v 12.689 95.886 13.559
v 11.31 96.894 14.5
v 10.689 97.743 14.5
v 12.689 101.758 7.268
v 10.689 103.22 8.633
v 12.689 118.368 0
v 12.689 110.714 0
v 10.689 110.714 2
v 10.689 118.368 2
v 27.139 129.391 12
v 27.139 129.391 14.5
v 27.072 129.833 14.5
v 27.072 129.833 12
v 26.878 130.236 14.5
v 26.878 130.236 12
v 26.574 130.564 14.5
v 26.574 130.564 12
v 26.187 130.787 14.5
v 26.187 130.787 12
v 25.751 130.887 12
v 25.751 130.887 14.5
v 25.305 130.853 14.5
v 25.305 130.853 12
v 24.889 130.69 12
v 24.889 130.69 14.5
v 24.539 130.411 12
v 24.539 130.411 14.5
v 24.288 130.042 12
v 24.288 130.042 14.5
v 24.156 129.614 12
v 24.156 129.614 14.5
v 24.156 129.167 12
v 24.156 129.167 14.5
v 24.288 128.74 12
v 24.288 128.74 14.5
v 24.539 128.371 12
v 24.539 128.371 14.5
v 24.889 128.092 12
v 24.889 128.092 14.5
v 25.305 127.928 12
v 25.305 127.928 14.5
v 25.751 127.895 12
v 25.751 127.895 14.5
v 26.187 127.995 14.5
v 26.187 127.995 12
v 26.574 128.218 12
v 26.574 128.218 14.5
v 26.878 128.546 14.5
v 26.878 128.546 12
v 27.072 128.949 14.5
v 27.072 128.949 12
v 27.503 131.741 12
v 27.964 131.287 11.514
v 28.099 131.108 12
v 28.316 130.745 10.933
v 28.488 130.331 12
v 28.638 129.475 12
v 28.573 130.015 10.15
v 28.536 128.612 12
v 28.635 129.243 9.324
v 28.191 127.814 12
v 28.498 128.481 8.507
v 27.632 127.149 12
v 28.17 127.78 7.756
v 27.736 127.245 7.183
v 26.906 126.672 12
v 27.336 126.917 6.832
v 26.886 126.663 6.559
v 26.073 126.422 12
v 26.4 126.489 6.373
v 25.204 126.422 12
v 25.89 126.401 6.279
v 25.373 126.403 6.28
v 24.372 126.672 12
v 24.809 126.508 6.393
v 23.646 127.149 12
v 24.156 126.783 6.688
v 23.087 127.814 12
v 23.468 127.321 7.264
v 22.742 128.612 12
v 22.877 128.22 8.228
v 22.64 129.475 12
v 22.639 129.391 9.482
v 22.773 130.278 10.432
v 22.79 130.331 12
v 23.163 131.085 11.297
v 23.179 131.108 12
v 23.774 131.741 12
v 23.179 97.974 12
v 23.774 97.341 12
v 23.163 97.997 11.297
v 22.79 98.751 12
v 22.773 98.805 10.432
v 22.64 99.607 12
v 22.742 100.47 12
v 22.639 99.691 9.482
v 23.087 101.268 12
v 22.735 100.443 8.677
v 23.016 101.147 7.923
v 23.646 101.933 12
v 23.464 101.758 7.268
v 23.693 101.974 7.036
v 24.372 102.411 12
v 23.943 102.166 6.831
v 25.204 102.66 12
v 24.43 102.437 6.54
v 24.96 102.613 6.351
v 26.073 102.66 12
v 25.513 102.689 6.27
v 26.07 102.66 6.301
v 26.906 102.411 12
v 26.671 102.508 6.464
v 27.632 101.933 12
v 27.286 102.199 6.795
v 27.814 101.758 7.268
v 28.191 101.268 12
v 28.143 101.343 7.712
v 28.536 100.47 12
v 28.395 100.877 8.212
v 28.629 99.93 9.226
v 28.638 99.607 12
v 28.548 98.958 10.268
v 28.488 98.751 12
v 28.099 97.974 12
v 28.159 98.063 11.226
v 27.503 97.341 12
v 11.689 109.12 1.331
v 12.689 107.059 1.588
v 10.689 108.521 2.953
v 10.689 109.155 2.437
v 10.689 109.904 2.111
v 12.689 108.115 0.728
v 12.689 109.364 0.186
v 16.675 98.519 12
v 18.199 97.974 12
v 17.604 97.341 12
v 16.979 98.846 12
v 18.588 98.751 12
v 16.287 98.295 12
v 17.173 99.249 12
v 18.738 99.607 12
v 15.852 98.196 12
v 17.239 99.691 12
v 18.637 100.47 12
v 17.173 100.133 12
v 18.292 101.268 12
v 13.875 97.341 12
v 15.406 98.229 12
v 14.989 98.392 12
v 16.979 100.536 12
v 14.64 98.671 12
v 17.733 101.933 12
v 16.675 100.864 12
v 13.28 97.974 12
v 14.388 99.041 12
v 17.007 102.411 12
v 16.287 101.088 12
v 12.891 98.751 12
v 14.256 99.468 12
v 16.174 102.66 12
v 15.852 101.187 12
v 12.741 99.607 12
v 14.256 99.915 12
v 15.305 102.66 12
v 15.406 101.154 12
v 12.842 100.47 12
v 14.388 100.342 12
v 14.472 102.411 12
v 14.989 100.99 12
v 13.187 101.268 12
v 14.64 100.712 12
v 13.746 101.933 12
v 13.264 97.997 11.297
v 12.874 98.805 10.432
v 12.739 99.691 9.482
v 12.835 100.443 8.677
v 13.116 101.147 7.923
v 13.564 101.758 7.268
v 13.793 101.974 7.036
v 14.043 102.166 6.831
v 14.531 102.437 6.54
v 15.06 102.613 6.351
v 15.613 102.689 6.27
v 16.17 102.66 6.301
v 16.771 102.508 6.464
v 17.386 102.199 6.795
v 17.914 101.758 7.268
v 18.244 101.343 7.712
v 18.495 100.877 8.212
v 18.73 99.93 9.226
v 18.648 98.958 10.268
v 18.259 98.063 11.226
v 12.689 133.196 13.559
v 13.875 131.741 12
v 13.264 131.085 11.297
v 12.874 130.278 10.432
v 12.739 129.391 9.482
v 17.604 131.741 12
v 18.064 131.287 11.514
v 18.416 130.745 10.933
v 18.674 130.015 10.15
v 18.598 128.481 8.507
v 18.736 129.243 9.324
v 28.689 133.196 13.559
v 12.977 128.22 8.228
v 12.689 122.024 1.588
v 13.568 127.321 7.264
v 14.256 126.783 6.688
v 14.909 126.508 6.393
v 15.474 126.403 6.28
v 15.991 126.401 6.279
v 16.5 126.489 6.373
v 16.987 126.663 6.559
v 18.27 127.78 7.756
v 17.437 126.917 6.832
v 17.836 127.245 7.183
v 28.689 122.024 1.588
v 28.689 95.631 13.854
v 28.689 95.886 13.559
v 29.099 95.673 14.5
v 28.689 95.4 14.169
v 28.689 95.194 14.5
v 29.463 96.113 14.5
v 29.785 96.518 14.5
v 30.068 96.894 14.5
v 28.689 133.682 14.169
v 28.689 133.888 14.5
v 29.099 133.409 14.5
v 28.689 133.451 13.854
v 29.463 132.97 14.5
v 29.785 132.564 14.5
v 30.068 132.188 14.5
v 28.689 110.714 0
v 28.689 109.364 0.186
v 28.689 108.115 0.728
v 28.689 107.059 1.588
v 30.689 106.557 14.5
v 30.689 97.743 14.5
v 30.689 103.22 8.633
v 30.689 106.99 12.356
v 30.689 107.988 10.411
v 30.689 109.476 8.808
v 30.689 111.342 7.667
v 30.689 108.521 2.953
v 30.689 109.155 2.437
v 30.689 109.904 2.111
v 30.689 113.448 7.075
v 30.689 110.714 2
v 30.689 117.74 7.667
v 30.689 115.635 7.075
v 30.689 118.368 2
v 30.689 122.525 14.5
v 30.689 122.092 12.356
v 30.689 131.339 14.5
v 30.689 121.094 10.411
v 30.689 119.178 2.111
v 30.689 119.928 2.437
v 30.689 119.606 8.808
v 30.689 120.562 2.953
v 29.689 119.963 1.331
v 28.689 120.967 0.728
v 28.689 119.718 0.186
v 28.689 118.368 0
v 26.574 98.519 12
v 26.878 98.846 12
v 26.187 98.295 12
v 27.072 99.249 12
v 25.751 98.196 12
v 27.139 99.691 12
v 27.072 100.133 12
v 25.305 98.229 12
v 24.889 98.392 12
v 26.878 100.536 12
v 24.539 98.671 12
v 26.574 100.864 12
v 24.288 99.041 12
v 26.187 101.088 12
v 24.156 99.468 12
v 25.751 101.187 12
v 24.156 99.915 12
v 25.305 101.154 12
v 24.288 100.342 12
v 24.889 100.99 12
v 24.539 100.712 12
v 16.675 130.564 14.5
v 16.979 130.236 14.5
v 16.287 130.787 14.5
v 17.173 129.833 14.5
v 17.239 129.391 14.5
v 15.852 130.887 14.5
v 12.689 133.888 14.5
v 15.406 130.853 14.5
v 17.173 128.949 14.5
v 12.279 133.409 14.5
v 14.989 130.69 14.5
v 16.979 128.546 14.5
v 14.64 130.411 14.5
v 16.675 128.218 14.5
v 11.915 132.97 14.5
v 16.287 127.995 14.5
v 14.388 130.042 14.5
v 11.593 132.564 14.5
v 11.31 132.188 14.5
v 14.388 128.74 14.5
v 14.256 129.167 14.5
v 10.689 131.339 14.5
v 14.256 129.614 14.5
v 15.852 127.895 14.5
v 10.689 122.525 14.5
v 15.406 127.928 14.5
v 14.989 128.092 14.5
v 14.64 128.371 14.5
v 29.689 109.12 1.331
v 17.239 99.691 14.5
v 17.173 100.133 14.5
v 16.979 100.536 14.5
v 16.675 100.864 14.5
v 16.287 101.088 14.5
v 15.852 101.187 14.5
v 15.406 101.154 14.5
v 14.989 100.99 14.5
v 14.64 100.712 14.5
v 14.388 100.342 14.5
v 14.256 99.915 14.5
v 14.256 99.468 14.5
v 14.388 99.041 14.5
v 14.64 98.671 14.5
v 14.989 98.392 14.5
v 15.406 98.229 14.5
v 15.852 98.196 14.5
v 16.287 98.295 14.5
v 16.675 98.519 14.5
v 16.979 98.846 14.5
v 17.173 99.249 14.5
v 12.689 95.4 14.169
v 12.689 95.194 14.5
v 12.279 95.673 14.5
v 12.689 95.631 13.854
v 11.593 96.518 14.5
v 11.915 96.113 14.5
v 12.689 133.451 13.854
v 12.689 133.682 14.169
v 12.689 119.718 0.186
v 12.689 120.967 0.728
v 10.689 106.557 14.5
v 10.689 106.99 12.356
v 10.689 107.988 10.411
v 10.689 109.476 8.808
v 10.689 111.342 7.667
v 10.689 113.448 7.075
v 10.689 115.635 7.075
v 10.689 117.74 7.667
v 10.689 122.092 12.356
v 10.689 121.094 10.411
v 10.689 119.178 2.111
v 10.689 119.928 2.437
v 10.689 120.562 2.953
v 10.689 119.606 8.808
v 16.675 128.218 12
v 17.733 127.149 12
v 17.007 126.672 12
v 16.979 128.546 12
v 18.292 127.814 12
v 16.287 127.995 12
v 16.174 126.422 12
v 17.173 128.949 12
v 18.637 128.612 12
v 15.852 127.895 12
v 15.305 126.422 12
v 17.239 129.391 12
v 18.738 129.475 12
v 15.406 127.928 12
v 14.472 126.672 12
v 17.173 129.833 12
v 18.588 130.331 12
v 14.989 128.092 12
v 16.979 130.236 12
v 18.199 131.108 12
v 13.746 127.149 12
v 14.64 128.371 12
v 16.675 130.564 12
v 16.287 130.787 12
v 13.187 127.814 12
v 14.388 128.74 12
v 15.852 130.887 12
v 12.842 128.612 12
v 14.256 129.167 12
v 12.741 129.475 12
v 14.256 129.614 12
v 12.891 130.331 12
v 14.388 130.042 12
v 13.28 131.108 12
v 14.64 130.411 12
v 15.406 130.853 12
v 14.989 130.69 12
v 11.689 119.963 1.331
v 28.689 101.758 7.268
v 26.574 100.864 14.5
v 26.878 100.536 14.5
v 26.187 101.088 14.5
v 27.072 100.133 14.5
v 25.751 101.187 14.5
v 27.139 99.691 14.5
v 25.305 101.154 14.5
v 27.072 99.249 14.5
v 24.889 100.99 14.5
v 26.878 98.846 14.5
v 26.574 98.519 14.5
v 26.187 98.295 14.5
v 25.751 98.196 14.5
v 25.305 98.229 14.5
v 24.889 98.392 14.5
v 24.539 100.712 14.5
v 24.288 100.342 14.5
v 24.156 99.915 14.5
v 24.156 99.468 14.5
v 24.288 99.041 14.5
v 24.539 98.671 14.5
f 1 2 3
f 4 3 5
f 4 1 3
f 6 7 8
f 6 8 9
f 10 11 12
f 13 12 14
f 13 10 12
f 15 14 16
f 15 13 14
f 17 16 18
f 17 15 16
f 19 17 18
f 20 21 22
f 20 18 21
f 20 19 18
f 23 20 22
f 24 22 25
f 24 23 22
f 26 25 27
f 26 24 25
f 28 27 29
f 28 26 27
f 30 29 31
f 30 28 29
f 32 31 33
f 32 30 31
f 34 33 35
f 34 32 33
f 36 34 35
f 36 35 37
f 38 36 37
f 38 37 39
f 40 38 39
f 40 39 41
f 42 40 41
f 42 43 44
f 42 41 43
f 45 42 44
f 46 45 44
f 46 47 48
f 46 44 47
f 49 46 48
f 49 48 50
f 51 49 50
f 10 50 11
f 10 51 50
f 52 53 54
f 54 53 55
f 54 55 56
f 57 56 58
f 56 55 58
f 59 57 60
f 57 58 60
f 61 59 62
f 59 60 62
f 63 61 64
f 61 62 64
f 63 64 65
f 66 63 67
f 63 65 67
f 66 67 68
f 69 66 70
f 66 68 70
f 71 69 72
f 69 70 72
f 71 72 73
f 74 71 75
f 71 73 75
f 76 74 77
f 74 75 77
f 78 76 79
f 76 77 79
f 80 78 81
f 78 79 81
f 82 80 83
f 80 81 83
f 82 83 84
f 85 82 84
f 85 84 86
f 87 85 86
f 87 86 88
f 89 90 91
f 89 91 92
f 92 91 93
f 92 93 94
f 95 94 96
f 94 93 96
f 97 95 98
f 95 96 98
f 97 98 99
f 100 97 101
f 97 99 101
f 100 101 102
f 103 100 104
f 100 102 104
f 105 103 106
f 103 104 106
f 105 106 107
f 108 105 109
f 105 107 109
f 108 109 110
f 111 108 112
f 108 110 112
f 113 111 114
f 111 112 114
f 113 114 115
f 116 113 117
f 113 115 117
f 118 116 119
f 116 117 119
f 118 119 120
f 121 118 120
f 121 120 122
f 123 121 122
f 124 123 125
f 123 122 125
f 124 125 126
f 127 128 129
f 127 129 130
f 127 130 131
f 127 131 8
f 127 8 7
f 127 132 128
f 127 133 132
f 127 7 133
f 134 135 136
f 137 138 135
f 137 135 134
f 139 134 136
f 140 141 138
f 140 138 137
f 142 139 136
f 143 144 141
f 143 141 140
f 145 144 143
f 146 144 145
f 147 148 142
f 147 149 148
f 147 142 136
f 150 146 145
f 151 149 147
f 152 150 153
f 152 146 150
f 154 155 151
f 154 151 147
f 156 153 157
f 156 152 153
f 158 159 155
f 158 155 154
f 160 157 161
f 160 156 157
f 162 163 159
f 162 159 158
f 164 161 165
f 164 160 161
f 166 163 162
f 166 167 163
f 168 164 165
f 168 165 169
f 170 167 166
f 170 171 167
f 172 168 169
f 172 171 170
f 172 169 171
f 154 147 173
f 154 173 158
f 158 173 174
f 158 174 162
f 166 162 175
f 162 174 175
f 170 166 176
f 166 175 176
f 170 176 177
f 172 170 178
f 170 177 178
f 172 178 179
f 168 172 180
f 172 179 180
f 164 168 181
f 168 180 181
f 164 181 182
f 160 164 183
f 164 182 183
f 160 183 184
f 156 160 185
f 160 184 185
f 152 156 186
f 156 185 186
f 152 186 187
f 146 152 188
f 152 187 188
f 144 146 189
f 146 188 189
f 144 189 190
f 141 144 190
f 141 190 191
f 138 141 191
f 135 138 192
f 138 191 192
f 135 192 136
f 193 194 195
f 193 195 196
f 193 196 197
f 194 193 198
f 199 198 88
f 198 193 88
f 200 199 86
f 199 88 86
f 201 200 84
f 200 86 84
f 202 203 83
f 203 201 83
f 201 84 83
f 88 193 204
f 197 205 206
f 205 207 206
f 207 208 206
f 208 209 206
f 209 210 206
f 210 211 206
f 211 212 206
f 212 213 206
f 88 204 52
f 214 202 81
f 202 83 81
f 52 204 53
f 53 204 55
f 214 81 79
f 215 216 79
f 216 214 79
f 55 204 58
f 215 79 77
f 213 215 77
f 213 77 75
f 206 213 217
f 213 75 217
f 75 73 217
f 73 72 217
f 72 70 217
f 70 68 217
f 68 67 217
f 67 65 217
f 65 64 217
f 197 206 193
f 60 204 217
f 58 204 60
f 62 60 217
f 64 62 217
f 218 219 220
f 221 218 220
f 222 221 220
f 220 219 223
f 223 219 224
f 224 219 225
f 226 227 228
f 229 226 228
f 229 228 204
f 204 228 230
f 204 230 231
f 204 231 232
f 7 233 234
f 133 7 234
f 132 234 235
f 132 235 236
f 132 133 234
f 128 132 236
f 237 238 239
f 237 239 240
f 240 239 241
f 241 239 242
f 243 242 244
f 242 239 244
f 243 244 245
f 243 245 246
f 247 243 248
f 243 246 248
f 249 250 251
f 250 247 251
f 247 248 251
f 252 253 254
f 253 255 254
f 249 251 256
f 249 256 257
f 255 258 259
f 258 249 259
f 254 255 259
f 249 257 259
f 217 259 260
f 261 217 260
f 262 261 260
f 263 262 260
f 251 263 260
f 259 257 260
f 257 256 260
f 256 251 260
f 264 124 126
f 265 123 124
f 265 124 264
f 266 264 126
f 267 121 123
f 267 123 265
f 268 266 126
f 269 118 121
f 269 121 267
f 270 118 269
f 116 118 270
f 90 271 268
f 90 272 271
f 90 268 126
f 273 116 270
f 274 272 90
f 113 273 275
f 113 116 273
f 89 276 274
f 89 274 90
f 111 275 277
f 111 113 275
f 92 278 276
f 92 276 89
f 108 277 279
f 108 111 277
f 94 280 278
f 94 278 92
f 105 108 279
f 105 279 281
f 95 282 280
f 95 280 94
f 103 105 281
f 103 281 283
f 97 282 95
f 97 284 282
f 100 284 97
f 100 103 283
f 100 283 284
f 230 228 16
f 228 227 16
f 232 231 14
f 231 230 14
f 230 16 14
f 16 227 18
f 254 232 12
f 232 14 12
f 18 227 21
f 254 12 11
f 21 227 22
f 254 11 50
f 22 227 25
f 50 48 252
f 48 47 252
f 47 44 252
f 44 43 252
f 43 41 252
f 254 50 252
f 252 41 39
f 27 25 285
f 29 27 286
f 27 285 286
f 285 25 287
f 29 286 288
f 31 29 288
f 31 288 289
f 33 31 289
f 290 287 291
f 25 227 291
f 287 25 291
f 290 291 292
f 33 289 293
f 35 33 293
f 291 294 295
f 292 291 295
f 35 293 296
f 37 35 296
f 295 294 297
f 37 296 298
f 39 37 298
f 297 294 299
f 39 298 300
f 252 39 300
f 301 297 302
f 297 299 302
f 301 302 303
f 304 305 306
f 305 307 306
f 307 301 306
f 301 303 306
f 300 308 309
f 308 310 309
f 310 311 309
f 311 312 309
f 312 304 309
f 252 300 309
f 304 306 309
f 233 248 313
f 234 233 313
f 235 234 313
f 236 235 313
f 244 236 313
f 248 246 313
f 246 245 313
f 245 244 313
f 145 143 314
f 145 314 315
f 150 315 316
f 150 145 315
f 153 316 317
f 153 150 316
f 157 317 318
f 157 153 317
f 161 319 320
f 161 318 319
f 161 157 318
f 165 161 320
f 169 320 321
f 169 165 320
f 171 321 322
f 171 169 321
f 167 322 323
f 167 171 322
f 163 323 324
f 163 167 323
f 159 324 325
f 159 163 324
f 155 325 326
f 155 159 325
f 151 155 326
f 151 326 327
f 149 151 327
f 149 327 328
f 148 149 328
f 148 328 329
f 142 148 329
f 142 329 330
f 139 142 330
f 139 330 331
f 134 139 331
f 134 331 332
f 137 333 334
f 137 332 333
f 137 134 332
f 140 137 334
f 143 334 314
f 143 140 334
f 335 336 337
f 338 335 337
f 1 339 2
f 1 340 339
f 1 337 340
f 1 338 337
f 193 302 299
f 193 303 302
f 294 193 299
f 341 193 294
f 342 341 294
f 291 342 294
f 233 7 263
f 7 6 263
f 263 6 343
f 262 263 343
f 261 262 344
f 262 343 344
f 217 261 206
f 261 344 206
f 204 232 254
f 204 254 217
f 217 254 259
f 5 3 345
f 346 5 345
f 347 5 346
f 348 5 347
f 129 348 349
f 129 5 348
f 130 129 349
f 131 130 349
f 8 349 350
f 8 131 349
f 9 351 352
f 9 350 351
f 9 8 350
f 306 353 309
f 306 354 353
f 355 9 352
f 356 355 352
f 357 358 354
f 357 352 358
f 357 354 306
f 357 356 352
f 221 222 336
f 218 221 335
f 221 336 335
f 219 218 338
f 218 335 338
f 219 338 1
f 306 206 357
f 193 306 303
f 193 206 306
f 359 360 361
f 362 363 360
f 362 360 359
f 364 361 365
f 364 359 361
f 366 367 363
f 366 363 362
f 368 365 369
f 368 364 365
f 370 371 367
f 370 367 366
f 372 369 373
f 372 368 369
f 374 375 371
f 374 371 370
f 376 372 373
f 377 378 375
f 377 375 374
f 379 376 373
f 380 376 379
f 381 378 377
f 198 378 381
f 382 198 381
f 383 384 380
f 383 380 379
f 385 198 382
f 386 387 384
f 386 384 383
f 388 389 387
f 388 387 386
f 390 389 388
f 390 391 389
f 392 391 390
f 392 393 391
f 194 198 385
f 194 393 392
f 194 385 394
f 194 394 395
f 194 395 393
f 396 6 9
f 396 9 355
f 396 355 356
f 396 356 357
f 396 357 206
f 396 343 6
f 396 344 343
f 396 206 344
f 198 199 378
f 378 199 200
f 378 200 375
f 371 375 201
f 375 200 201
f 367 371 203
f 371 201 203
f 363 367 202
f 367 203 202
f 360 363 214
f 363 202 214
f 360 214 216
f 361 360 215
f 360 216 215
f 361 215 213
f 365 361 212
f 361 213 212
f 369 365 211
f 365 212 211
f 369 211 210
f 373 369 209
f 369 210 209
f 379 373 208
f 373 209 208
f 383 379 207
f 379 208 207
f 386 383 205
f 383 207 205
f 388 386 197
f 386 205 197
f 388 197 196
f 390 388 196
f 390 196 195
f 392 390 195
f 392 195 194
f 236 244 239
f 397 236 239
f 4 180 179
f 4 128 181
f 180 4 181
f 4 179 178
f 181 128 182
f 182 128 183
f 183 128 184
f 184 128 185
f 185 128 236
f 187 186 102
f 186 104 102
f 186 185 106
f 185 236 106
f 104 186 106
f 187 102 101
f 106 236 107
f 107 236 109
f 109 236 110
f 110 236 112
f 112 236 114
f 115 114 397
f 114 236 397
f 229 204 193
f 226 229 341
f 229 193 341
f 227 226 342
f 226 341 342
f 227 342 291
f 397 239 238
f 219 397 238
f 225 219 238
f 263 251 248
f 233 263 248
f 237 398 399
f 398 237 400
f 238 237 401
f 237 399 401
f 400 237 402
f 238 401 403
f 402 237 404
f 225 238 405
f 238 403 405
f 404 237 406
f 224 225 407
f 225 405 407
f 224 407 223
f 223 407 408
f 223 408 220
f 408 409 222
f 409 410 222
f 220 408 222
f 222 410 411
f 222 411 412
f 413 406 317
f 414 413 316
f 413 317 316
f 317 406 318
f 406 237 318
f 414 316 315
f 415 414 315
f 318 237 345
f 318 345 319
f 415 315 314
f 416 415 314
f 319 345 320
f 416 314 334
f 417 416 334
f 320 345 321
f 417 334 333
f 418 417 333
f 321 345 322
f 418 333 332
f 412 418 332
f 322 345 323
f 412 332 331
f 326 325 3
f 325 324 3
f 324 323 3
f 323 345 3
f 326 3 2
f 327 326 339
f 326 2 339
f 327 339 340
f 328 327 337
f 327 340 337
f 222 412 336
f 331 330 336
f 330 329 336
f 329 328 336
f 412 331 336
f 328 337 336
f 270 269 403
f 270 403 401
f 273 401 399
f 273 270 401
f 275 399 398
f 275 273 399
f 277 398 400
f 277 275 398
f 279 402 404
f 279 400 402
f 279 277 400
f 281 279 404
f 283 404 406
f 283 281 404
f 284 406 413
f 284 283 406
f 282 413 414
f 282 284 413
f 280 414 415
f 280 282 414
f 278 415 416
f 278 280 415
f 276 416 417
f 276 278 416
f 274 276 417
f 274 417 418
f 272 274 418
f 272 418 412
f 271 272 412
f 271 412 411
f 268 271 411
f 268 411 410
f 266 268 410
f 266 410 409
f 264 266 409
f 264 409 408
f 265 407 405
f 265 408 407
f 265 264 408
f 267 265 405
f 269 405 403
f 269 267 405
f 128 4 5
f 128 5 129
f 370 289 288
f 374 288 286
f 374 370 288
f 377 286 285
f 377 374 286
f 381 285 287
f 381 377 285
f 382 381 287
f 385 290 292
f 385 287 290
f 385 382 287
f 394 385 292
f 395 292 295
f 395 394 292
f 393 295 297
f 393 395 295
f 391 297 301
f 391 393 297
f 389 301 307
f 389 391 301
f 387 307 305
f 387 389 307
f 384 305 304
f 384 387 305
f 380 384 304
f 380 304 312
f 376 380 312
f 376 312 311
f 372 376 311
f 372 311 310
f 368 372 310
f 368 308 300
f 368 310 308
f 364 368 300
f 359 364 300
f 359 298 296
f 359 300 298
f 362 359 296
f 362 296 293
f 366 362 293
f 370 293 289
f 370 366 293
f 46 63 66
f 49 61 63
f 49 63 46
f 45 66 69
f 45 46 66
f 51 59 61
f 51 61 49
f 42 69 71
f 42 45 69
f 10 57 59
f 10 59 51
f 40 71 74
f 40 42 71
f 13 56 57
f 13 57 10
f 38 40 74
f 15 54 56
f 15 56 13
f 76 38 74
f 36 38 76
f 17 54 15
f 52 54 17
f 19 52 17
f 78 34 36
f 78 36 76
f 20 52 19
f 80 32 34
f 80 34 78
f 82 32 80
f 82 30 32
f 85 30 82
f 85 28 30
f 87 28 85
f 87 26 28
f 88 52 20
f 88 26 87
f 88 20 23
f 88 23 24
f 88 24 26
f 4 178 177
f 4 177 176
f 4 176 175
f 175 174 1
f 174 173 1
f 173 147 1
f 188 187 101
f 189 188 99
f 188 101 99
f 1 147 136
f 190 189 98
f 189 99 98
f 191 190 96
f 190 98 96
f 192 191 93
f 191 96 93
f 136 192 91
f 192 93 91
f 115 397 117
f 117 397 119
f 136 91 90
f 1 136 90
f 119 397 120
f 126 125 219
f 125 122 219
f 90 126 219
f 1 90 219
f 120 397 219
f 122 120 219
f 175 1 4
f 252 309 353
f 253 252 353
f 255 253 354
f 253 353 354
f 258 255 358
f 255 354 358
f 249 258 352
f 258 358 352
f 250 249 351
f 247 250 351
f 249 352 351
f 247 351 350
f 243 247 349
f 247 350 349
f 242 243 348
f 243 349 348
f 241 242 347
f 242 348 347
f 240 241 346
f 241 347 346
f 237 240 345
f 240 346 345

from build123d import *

# Parameters (mm, degrees)
SKETCH2_W           = 20
SKETCH2_H           = 49.6
SKETCH2_R           = 1.5
BOSS_EXTRUDE1_DEPTH = 30
CUT_EXTRUDE1_DEPTH  = 30
CUT_EXTRUDE2_DEPTH  = 22
FILLET1_R           = 5
FILLET2_R           = 2
CHAMFER1_SIZE       = 2
SKETCH5_R           = 3
SKETCH5_R_2         = 1.5
CUT_EXTRUDE3_DEPTH  = 12
CUT_EXTRUDE4_DEPTH  = 23


with BuildPart() as part:
    # Sketch2 → Boss-Extrude1 (new body)
    with BuildSketch(Plane.XY):
        with Locations((20.689228864, 114.541105708)):
            Rectangle(SKETCH2_W, SKETCH2_H)
        with Locations((15.739481395, 99.69135824)):
            Circle(SKETCH2_R, mode=Mode.SUBTRACT)
        with Locations((25.638976332, 99.69135824)):
            Circle(SKETCH2_R, mode=Mode.SUBTRACT)
        with Locations((25.638976332, 129.390853177)):
            Circle(SKETCH2_R, mode=Mode.SUBTRACT)
        with Locations((15.739481395, 129.390853177)):
            Circle(SKETCH2_R, mode=Mode.SUBTRACT)
    extrude(amount=BOSS_EXTRUDE1_DEPTH)

    # Sketch3 → Cut-Extrude1 (cut)
    with BuildSketch(Plane(origin=(30.689228864, 0, 0), x_dir=(0, 0, -1), z_dir=(1, 0, 0))):
        Polygon((-10, 119.541105708), (-18.024193548, 119.541105708), (-11.975806452, 109.541105708), (-10, 109.541105708), align=None)
        Polygon((-11.975806452, 109.541105708), (-18.024193548, 119.541105708), (-20, 119.541105708), (-20, 109.541105708), align=None)
    extrude(amount=-CUT_EXTRUDE1_DEPTH, mode=Mode.SUBTRACT)

    # Sketch4 → Cut-Extrude2 (cut)
    with BuildSketch(Plane(origin=(30.689228864, 0, 0), x_dir=(0, 0, -1), z_dir=(1, 0, 0))):
        Polygon((-30, 139.341105708), (-27.096774194, 134.541105708), (-15, 134.541105708), (0, 134.541105708), (0, 139.341105708), align=None)
        Polygon((-30, 134.541105708), (-27.096774194, 134.541105708), (-30, 139.341105708), align=None)
        Polygon((-15, 134.541105708), (0, 120.541105708), (0, 134.541105708), align=None)
        Polygon((-7.268041237, 101.757600554), (-2.903225806, 94.541105708), (0, 94.541105708), (0, 108.541105708), align=None)
        Polygon((-15, 94.541105708), (-2.903225806, 94.541105708), (-7.268041237, 101.757600554), align=None)
        Polygon((-30, 89.741105708), (0, 89.741105708), (-2.903225806, 94.541105708), (-15, 94.541105708), (-30, 94.541105708), align=None)
        Polygon((-2.903225806, 94.541105708), (0, 89.741105708), (0, 94.541105708), align=None)
    extrude(amount=-CUT_EXTRUDE2_DEPTH, mode=Mode.SUBTRACT)

    # Fillet1
    fillet1_edges = [part.edges().sort_by_distance(p)[0] for p in [
        (20.689228864, 134.541105708, 15),
        (20.689228864, 120.541105708, 0),
        (20.689228864, 94.541105708, 15),
        (20.689228864, 108.541105708, 0),
    ]]
    fillet(fillet1_edges, radius=FILLET1_R)

    # Fillet2
    fillet2_edges = [part.edges().sort_by_distance(p)[0] for p in [
        (20.689228864, 134.541105708, 30),
        (20.689228864, 94.541105708, 30),
    ]]
    fillet(fillet2_edges, radius=FILLET2_R)

    # Chamfer1
    chamfer1_edges = [part.edges().sort_by_distance(p)[0] for p in [
        (30.689228864, 127.610001295, 7.5738167),
        (10.689228864, 127.610001295, 7.5738167),
        (30.689228864, 114.541105708, 0),
        (30.689228864, 101.472210122, 7.5738167),
        (30.689228864, 108.721124919, 0.414263622),
        (30.689228864, 120.361086498, 0.414263622),
        (30.689228864, 94.889418826, 15.137292206),
        (30.689228864, 134.192792591, 15.137292206),
        (10.689228864, 114.541105708, 0),
        (10.689228864, 101.472210122, 7.5738167),
        (10.689228864, 108.721124919, 0.414263622),
        (10.689228864, 120.361086498, 0.414263622),
        (10.689228864, 94.889418826, 15.137292206),
        (10.689228864, 134.192792591, 15.137292206),
        (10.689228864, 114.541105708, 30),
        (30.689228864, 114.541105708, 30),
        (30.689228864, 134.541105708, 22.485407952),
        (30.689228864, 94.541105708, 22.485407952),
        (30.689228864, 133.955319271, 29.414213562),
        (30.689228864, 95.126892146, 29.414213562),
        (10.689228864, 94.541105708, 22.485407952),
        (10.689228864, 134.541105708, 22.485407952),
        (10.689228864, 133.955319271, 29.414213562),
        (10.689228864, 95.126892146, 29.414213562),
    ]]
    chamfer(chamfer1_edges, length=CHAMFER1_SIZE - 0.0001)  # a hair under: the kernel refuses the full size

    # Sketch5 → Cut-Extrude3 (cut)
    # profile 1 of 4: a face of its own
    with BuildSketch(Plane(origin=(0, 0, 0), x_dir=(-1, 0, 0), z_dir=(0, 0, -1))):
        with Locations((-15.739481395, 99.69135824)):
            Circle(SKETCH5_R)
        with Locations((-15.739481395, 99.69135824)):
            Circle(SKETCH5_R_2, mode=Mode.SUBTRACT)
    # profile 2 of 4: a face of its own
    with BuildSketch(Plane(origin=(0, 0, 0), x_dir=(-1, 0, 0), z_dir=(0, 0, -1))):
        with Locations((-25.638976332, 99.69135824)):
            Circle(SKETCH5_R)
        with Locations((-25.638976332, 99.69135824)):
            Circle(SKETCH5_R_2, mode=Mode.SUBTRACT)
    # profile 3 of 4: a face of its own
    with BuildSketch(Plane(origin=(0, 0, 0), x_dir=(-1, 0, 0), z_dir=(0, 0, -1))):
        with Locations((-15.739481395, 129.390853177)):
            Circle(SKETCH5_R)
        with Locations((-15.739481395, 129.390853177)):
            Circle(SKETCH5_R_2, mode=Mode.SUBTRACT)
    # profile 4 of 4: a face of its own
    with BuildSketch(Plane(origin=(0, 0, 0), x_dir=(-1, 0, 0), z_dir=(0, 0, -1))):
        with Locations((-25.638976332, 129.390853177)):
            Circle(SKETCH5_R)
        with Locations((-25.638976332, 129.390853177)):
            Circle(SKETCH5_R_2, mode=Mode.SUBTRACT)
    extrude(amount=-CUT_EXTRUDE3_DEPTH, mode=Mode.SUBTRACT)

    # Sketch6 → Cut-Extrude4 (cut)
    with BuildSketch(Plane.ZY.offset(-10.689228864)):
        with BuildLine():
            ThreePointArc((16.970815903, 96.541105708), (16.478743483, 96.581736733), (16, 96.70252922))
            Line((16, 96.70252922), (16, 91.202832585))
            Line((16, 91.202832585), (39.910531439, 91.202832585))
            Line((39.910531439, 91.202832585), (39.910531439, 137.879378832))
            Line((39.910531439, 137.879378832), (16, 137.879378832))
            Line((16, 137.879378832), (16, 132.379682197))
            ThreePointArc((16, 132.379682197), (16.478743483, 132.500474684), (16.970815903, 132.541105708))
            Line((16.970815903, 132.541105708), (28, 132.541105708))
            Line((28, 132.541105708), (28, 96.541105708))
            Line((28, 96.541105708), (16.970815903, 96.541105708))
        make_face()
        with BuildLine():
            ThreePointArc((23, 114.541105708), (21, 109.249603086), (16, 106.603851775))
            Line((16, 106.603851775), (16, 96.70252922))
            ThreePointArc((16, 96.70252922), (16.478743483, 96.581736733), (16.970815903, 96.541105708))
            Line((16.970815903, 96.541105708), (28, 96.541105708))
            Line((28, 96.541105708), (28, 132.541105708))
            Line((28, 132.541105708), (16.970815903, 132.541105708))
            ThreePointArc((16.970815903, 132.541105708), (16.478743483, 132.500474684), (16, 132.379682197))
            Line((16, 132.379682197), (16, 122.478359641))
            ThreePointArc((16, 122.478359641), (21, 119.83260833), (23, 114.541105708))
        make_face()
        Polygon((20, 119.541105708), (16, 115.541105708), (16, 109.541105708), (20, 109.541105708), align=None)
        Polygon((16, 119.541105708), (16, 115.541105708), (20, 119.541105708), align=None)
        with BuildLine():
            Line((14.5, 109.541105708), (10, 109.541105708))
            Line((10, 109.541105708), (10, 119.541105708))
            Line((10, 119.541105708), (14.5, 119.541105708))
            Line((14.5, 119.541105708), (14.5, 122.52546542))
            ThreePointArc((14.5, 122.52546542), (7, 114.541105708), (14.5, 106.556745997))
            Line((14.5, 106.556745997), (14.5, 109.541105708))
        make_face()
        with BuildLine():
            Line((20, 109.541105708), (16, 109.541105708))
            Line((16, 109.541105708), (16, 106.603851775))
            ThreePointArc((16, 106.603851775), (21, 109.249603086), (23, 114.541105708))
            ThreePointArc((23, 114.541105708), (21, 119.83260833), (16, 122.478359641))
            Line((16, 122.478359641), (16, 119.541105708))
            Line((16, 119.541105708), (20, 119.541105708))
            Line((20, 119.541105708), (20, 109.541105708))
        make_face()
        Polygon((10, 119.541105708), (10, 109.541105708), (14.5, 114.041105708), (14.5, 119.541105708), align=None)
        with BuildLine():
            Line((14.5, 122.52546542), (14.5, 119.541105708))
            Line((14.5, 119.541105708), (15, 119.541105708))
            Line((15, 119.541105708), (15, 122.541105708))
            ThreePointArc((15, 122.541105708), (14.749877721, 122.53719468), (14.5, 122.52546542))
        make_face()
        with BuildLine():
            Line((15, 122.541105708), (15, 119.541105708))
            Line((15, 119.541105708), (16, 119.541105708))
            Line((16, 119.541105708), (16, 122.478359641))
            ThreePointArc((16, 122.478359641), (15.5009833, 122.525403782), (15, 122.541105708))
        make_face()
        Polygon((14.5, 119.541105708), (14.5, 114.041105708), (15, 114.541105708), (15, 119.541105708), align=None)
        Polygon((15, 119.541105708), (15, 114.541105708), (16, 115.541105708), (16, 119.541105708), align=None)
        Polygon((14.5, 114.041105708), (10, 109.541105708), (14.5, 109.541105708), align=None)
        Polygon((15, 114.541105708), (14.5, 114.041105708), (14.5, 109.541105708), (15, 109.541105708), align=None)
        Polygon((16, 115.541105708), (15, 114.541105708), (15, 109.541105708), (16, 109.541105708), align=None)
        with BuildLine():
            Line((15, 109.541105708), (14.5, 109.541105708))
            Line((14.5, 109.541105708), (14.5, 106.556745997))
            ThreePointArc((14.5, 106.556745997), (14.749877721, 106.545016736), (15, 106.541105708))
            Line((15, 106.541105708), (15, 109.541105708))
        make_face()
        with BuildLine():
            Line((16, 109.541105708), (15, 109.541105708))
            Line((15, 109.541105708), (15, 106.541105708))
            ThreePointArc((15, 106.541105708), (15.5009833, 106.556807634), (16, 106.603851775))
            Line((16, 106.603851775), (16, 109.541105708))
        make_face()
        with BuildLine():
            ThreePointArc((15, 106.541105708), (14.749877721, 106.545016736), (14.5, 106.556745997))
            Line((14.5, 106.556745997), (14.5, 97.743543645))
            Line((14.5, 97.743543645), (14.923861152, 97.347939904))
            ThreePointArc((14.923861152, 97.347939904), (14.961637209, 97.313281439), (15, 97.279273558))
            Line((15, 97.279273558), (15, 106.541105708))
        make_face()
        with BuildLine():
            ThreePointArc((16, 106.603851775), (15.5009833, 106.556807634), (15, 106.541105708))
            Line((15, 106.541105708), (15, 97.279273558))
            ThreePointArc((15, 97.279273558), (15.471997059, 96.942347914), (16, 96.70252922))
            Line((16, 96.70252922), (16, 106.603851775))
        make_face()
        with BuildLine():
            Line((14.923861152, 97.347939904), (14.5, 97.743543645))
            Line((14.5, 97.743543645), (14.5, 91.202832585))
            Line((14.5, 91.202832585), (15, 91.202832585))
            Line((15, 91.202832585), (15, 97.279273558))
            ThreePointArc((15, 97.279273558), (14.961637209, 97.313281439), (14.923861152, 97.347939904))
        make_face()
        with BuildLine():
            ThreePointArc((16, 96.70252922), (15.471997059, 96.942347914), (15, 97.279273558))
            Line((15, 97.279273558), (15, 91.202832585))
            Line((15, 91.202832585), (16, 91.202832585))
            Line((16, 91.202832585), (16, 96.70252922))
        make_face()
        with BuildLine():
            Line((14.5, 131.338667771), (14.5, 122.52546542))
            ThreePointArc((14.5, 122.52546542), (14.749877721, 122.53719468), (15, 122.541105708))
            Line((15, 122.541105708), (15, 131.802937859))
            ThreePointArc((15, 131.802937859), (14.961637209, 131.768929978), (14.923861152, 131.734271513))
            Line((14.923861152, 131.734271513), (14.5, 131.338667771))
        make_face()
        with BuildLine():
            Line((15, 131.802937859), (15, 122.541105708))
            ThreePointArc((15, 122.541105708), (15.5009833, 122.525403782), (16, 122.478359641))
            Line((16, 122.478359641), (16, 132.379682197))
            ThreePointArc((16, 132.379682197), (15.471997059, 132.139863502), (15, 131.802937859))
        make_face()
        with BuildLine():
            Line((14.5, 137.879378832), (14.5, 131.338667771))
            Line((14.5, 131.338667771), (14.923861152, 131.734271513))
            ThreePointArc((14.923861152, 131.734271513), (14.961637209, 131.768929978), (15, 131.802937859))
            Line((15, 131.802937859), (15, 137.879378832))
            Line((15, 137.879378832), (14.5, 137.879378832))
        make_face()
        with BuildLine():
            Line((15, 137.879378832), (15, 131.802937859))
            ThreePointArc((15, 131.802937859), (15.471997059, 132.139863502), (16, 132.379682197))
            Line((16, 132.379682197), (16, 137.879378832))
            Line((16, 137.879378832), (15, 137.879378832))
        make_face()
    extrude(amount=-CUT_EXTRUDE4_DEPTH, mode=Mode.SUBTRACT)


solid = part.part
